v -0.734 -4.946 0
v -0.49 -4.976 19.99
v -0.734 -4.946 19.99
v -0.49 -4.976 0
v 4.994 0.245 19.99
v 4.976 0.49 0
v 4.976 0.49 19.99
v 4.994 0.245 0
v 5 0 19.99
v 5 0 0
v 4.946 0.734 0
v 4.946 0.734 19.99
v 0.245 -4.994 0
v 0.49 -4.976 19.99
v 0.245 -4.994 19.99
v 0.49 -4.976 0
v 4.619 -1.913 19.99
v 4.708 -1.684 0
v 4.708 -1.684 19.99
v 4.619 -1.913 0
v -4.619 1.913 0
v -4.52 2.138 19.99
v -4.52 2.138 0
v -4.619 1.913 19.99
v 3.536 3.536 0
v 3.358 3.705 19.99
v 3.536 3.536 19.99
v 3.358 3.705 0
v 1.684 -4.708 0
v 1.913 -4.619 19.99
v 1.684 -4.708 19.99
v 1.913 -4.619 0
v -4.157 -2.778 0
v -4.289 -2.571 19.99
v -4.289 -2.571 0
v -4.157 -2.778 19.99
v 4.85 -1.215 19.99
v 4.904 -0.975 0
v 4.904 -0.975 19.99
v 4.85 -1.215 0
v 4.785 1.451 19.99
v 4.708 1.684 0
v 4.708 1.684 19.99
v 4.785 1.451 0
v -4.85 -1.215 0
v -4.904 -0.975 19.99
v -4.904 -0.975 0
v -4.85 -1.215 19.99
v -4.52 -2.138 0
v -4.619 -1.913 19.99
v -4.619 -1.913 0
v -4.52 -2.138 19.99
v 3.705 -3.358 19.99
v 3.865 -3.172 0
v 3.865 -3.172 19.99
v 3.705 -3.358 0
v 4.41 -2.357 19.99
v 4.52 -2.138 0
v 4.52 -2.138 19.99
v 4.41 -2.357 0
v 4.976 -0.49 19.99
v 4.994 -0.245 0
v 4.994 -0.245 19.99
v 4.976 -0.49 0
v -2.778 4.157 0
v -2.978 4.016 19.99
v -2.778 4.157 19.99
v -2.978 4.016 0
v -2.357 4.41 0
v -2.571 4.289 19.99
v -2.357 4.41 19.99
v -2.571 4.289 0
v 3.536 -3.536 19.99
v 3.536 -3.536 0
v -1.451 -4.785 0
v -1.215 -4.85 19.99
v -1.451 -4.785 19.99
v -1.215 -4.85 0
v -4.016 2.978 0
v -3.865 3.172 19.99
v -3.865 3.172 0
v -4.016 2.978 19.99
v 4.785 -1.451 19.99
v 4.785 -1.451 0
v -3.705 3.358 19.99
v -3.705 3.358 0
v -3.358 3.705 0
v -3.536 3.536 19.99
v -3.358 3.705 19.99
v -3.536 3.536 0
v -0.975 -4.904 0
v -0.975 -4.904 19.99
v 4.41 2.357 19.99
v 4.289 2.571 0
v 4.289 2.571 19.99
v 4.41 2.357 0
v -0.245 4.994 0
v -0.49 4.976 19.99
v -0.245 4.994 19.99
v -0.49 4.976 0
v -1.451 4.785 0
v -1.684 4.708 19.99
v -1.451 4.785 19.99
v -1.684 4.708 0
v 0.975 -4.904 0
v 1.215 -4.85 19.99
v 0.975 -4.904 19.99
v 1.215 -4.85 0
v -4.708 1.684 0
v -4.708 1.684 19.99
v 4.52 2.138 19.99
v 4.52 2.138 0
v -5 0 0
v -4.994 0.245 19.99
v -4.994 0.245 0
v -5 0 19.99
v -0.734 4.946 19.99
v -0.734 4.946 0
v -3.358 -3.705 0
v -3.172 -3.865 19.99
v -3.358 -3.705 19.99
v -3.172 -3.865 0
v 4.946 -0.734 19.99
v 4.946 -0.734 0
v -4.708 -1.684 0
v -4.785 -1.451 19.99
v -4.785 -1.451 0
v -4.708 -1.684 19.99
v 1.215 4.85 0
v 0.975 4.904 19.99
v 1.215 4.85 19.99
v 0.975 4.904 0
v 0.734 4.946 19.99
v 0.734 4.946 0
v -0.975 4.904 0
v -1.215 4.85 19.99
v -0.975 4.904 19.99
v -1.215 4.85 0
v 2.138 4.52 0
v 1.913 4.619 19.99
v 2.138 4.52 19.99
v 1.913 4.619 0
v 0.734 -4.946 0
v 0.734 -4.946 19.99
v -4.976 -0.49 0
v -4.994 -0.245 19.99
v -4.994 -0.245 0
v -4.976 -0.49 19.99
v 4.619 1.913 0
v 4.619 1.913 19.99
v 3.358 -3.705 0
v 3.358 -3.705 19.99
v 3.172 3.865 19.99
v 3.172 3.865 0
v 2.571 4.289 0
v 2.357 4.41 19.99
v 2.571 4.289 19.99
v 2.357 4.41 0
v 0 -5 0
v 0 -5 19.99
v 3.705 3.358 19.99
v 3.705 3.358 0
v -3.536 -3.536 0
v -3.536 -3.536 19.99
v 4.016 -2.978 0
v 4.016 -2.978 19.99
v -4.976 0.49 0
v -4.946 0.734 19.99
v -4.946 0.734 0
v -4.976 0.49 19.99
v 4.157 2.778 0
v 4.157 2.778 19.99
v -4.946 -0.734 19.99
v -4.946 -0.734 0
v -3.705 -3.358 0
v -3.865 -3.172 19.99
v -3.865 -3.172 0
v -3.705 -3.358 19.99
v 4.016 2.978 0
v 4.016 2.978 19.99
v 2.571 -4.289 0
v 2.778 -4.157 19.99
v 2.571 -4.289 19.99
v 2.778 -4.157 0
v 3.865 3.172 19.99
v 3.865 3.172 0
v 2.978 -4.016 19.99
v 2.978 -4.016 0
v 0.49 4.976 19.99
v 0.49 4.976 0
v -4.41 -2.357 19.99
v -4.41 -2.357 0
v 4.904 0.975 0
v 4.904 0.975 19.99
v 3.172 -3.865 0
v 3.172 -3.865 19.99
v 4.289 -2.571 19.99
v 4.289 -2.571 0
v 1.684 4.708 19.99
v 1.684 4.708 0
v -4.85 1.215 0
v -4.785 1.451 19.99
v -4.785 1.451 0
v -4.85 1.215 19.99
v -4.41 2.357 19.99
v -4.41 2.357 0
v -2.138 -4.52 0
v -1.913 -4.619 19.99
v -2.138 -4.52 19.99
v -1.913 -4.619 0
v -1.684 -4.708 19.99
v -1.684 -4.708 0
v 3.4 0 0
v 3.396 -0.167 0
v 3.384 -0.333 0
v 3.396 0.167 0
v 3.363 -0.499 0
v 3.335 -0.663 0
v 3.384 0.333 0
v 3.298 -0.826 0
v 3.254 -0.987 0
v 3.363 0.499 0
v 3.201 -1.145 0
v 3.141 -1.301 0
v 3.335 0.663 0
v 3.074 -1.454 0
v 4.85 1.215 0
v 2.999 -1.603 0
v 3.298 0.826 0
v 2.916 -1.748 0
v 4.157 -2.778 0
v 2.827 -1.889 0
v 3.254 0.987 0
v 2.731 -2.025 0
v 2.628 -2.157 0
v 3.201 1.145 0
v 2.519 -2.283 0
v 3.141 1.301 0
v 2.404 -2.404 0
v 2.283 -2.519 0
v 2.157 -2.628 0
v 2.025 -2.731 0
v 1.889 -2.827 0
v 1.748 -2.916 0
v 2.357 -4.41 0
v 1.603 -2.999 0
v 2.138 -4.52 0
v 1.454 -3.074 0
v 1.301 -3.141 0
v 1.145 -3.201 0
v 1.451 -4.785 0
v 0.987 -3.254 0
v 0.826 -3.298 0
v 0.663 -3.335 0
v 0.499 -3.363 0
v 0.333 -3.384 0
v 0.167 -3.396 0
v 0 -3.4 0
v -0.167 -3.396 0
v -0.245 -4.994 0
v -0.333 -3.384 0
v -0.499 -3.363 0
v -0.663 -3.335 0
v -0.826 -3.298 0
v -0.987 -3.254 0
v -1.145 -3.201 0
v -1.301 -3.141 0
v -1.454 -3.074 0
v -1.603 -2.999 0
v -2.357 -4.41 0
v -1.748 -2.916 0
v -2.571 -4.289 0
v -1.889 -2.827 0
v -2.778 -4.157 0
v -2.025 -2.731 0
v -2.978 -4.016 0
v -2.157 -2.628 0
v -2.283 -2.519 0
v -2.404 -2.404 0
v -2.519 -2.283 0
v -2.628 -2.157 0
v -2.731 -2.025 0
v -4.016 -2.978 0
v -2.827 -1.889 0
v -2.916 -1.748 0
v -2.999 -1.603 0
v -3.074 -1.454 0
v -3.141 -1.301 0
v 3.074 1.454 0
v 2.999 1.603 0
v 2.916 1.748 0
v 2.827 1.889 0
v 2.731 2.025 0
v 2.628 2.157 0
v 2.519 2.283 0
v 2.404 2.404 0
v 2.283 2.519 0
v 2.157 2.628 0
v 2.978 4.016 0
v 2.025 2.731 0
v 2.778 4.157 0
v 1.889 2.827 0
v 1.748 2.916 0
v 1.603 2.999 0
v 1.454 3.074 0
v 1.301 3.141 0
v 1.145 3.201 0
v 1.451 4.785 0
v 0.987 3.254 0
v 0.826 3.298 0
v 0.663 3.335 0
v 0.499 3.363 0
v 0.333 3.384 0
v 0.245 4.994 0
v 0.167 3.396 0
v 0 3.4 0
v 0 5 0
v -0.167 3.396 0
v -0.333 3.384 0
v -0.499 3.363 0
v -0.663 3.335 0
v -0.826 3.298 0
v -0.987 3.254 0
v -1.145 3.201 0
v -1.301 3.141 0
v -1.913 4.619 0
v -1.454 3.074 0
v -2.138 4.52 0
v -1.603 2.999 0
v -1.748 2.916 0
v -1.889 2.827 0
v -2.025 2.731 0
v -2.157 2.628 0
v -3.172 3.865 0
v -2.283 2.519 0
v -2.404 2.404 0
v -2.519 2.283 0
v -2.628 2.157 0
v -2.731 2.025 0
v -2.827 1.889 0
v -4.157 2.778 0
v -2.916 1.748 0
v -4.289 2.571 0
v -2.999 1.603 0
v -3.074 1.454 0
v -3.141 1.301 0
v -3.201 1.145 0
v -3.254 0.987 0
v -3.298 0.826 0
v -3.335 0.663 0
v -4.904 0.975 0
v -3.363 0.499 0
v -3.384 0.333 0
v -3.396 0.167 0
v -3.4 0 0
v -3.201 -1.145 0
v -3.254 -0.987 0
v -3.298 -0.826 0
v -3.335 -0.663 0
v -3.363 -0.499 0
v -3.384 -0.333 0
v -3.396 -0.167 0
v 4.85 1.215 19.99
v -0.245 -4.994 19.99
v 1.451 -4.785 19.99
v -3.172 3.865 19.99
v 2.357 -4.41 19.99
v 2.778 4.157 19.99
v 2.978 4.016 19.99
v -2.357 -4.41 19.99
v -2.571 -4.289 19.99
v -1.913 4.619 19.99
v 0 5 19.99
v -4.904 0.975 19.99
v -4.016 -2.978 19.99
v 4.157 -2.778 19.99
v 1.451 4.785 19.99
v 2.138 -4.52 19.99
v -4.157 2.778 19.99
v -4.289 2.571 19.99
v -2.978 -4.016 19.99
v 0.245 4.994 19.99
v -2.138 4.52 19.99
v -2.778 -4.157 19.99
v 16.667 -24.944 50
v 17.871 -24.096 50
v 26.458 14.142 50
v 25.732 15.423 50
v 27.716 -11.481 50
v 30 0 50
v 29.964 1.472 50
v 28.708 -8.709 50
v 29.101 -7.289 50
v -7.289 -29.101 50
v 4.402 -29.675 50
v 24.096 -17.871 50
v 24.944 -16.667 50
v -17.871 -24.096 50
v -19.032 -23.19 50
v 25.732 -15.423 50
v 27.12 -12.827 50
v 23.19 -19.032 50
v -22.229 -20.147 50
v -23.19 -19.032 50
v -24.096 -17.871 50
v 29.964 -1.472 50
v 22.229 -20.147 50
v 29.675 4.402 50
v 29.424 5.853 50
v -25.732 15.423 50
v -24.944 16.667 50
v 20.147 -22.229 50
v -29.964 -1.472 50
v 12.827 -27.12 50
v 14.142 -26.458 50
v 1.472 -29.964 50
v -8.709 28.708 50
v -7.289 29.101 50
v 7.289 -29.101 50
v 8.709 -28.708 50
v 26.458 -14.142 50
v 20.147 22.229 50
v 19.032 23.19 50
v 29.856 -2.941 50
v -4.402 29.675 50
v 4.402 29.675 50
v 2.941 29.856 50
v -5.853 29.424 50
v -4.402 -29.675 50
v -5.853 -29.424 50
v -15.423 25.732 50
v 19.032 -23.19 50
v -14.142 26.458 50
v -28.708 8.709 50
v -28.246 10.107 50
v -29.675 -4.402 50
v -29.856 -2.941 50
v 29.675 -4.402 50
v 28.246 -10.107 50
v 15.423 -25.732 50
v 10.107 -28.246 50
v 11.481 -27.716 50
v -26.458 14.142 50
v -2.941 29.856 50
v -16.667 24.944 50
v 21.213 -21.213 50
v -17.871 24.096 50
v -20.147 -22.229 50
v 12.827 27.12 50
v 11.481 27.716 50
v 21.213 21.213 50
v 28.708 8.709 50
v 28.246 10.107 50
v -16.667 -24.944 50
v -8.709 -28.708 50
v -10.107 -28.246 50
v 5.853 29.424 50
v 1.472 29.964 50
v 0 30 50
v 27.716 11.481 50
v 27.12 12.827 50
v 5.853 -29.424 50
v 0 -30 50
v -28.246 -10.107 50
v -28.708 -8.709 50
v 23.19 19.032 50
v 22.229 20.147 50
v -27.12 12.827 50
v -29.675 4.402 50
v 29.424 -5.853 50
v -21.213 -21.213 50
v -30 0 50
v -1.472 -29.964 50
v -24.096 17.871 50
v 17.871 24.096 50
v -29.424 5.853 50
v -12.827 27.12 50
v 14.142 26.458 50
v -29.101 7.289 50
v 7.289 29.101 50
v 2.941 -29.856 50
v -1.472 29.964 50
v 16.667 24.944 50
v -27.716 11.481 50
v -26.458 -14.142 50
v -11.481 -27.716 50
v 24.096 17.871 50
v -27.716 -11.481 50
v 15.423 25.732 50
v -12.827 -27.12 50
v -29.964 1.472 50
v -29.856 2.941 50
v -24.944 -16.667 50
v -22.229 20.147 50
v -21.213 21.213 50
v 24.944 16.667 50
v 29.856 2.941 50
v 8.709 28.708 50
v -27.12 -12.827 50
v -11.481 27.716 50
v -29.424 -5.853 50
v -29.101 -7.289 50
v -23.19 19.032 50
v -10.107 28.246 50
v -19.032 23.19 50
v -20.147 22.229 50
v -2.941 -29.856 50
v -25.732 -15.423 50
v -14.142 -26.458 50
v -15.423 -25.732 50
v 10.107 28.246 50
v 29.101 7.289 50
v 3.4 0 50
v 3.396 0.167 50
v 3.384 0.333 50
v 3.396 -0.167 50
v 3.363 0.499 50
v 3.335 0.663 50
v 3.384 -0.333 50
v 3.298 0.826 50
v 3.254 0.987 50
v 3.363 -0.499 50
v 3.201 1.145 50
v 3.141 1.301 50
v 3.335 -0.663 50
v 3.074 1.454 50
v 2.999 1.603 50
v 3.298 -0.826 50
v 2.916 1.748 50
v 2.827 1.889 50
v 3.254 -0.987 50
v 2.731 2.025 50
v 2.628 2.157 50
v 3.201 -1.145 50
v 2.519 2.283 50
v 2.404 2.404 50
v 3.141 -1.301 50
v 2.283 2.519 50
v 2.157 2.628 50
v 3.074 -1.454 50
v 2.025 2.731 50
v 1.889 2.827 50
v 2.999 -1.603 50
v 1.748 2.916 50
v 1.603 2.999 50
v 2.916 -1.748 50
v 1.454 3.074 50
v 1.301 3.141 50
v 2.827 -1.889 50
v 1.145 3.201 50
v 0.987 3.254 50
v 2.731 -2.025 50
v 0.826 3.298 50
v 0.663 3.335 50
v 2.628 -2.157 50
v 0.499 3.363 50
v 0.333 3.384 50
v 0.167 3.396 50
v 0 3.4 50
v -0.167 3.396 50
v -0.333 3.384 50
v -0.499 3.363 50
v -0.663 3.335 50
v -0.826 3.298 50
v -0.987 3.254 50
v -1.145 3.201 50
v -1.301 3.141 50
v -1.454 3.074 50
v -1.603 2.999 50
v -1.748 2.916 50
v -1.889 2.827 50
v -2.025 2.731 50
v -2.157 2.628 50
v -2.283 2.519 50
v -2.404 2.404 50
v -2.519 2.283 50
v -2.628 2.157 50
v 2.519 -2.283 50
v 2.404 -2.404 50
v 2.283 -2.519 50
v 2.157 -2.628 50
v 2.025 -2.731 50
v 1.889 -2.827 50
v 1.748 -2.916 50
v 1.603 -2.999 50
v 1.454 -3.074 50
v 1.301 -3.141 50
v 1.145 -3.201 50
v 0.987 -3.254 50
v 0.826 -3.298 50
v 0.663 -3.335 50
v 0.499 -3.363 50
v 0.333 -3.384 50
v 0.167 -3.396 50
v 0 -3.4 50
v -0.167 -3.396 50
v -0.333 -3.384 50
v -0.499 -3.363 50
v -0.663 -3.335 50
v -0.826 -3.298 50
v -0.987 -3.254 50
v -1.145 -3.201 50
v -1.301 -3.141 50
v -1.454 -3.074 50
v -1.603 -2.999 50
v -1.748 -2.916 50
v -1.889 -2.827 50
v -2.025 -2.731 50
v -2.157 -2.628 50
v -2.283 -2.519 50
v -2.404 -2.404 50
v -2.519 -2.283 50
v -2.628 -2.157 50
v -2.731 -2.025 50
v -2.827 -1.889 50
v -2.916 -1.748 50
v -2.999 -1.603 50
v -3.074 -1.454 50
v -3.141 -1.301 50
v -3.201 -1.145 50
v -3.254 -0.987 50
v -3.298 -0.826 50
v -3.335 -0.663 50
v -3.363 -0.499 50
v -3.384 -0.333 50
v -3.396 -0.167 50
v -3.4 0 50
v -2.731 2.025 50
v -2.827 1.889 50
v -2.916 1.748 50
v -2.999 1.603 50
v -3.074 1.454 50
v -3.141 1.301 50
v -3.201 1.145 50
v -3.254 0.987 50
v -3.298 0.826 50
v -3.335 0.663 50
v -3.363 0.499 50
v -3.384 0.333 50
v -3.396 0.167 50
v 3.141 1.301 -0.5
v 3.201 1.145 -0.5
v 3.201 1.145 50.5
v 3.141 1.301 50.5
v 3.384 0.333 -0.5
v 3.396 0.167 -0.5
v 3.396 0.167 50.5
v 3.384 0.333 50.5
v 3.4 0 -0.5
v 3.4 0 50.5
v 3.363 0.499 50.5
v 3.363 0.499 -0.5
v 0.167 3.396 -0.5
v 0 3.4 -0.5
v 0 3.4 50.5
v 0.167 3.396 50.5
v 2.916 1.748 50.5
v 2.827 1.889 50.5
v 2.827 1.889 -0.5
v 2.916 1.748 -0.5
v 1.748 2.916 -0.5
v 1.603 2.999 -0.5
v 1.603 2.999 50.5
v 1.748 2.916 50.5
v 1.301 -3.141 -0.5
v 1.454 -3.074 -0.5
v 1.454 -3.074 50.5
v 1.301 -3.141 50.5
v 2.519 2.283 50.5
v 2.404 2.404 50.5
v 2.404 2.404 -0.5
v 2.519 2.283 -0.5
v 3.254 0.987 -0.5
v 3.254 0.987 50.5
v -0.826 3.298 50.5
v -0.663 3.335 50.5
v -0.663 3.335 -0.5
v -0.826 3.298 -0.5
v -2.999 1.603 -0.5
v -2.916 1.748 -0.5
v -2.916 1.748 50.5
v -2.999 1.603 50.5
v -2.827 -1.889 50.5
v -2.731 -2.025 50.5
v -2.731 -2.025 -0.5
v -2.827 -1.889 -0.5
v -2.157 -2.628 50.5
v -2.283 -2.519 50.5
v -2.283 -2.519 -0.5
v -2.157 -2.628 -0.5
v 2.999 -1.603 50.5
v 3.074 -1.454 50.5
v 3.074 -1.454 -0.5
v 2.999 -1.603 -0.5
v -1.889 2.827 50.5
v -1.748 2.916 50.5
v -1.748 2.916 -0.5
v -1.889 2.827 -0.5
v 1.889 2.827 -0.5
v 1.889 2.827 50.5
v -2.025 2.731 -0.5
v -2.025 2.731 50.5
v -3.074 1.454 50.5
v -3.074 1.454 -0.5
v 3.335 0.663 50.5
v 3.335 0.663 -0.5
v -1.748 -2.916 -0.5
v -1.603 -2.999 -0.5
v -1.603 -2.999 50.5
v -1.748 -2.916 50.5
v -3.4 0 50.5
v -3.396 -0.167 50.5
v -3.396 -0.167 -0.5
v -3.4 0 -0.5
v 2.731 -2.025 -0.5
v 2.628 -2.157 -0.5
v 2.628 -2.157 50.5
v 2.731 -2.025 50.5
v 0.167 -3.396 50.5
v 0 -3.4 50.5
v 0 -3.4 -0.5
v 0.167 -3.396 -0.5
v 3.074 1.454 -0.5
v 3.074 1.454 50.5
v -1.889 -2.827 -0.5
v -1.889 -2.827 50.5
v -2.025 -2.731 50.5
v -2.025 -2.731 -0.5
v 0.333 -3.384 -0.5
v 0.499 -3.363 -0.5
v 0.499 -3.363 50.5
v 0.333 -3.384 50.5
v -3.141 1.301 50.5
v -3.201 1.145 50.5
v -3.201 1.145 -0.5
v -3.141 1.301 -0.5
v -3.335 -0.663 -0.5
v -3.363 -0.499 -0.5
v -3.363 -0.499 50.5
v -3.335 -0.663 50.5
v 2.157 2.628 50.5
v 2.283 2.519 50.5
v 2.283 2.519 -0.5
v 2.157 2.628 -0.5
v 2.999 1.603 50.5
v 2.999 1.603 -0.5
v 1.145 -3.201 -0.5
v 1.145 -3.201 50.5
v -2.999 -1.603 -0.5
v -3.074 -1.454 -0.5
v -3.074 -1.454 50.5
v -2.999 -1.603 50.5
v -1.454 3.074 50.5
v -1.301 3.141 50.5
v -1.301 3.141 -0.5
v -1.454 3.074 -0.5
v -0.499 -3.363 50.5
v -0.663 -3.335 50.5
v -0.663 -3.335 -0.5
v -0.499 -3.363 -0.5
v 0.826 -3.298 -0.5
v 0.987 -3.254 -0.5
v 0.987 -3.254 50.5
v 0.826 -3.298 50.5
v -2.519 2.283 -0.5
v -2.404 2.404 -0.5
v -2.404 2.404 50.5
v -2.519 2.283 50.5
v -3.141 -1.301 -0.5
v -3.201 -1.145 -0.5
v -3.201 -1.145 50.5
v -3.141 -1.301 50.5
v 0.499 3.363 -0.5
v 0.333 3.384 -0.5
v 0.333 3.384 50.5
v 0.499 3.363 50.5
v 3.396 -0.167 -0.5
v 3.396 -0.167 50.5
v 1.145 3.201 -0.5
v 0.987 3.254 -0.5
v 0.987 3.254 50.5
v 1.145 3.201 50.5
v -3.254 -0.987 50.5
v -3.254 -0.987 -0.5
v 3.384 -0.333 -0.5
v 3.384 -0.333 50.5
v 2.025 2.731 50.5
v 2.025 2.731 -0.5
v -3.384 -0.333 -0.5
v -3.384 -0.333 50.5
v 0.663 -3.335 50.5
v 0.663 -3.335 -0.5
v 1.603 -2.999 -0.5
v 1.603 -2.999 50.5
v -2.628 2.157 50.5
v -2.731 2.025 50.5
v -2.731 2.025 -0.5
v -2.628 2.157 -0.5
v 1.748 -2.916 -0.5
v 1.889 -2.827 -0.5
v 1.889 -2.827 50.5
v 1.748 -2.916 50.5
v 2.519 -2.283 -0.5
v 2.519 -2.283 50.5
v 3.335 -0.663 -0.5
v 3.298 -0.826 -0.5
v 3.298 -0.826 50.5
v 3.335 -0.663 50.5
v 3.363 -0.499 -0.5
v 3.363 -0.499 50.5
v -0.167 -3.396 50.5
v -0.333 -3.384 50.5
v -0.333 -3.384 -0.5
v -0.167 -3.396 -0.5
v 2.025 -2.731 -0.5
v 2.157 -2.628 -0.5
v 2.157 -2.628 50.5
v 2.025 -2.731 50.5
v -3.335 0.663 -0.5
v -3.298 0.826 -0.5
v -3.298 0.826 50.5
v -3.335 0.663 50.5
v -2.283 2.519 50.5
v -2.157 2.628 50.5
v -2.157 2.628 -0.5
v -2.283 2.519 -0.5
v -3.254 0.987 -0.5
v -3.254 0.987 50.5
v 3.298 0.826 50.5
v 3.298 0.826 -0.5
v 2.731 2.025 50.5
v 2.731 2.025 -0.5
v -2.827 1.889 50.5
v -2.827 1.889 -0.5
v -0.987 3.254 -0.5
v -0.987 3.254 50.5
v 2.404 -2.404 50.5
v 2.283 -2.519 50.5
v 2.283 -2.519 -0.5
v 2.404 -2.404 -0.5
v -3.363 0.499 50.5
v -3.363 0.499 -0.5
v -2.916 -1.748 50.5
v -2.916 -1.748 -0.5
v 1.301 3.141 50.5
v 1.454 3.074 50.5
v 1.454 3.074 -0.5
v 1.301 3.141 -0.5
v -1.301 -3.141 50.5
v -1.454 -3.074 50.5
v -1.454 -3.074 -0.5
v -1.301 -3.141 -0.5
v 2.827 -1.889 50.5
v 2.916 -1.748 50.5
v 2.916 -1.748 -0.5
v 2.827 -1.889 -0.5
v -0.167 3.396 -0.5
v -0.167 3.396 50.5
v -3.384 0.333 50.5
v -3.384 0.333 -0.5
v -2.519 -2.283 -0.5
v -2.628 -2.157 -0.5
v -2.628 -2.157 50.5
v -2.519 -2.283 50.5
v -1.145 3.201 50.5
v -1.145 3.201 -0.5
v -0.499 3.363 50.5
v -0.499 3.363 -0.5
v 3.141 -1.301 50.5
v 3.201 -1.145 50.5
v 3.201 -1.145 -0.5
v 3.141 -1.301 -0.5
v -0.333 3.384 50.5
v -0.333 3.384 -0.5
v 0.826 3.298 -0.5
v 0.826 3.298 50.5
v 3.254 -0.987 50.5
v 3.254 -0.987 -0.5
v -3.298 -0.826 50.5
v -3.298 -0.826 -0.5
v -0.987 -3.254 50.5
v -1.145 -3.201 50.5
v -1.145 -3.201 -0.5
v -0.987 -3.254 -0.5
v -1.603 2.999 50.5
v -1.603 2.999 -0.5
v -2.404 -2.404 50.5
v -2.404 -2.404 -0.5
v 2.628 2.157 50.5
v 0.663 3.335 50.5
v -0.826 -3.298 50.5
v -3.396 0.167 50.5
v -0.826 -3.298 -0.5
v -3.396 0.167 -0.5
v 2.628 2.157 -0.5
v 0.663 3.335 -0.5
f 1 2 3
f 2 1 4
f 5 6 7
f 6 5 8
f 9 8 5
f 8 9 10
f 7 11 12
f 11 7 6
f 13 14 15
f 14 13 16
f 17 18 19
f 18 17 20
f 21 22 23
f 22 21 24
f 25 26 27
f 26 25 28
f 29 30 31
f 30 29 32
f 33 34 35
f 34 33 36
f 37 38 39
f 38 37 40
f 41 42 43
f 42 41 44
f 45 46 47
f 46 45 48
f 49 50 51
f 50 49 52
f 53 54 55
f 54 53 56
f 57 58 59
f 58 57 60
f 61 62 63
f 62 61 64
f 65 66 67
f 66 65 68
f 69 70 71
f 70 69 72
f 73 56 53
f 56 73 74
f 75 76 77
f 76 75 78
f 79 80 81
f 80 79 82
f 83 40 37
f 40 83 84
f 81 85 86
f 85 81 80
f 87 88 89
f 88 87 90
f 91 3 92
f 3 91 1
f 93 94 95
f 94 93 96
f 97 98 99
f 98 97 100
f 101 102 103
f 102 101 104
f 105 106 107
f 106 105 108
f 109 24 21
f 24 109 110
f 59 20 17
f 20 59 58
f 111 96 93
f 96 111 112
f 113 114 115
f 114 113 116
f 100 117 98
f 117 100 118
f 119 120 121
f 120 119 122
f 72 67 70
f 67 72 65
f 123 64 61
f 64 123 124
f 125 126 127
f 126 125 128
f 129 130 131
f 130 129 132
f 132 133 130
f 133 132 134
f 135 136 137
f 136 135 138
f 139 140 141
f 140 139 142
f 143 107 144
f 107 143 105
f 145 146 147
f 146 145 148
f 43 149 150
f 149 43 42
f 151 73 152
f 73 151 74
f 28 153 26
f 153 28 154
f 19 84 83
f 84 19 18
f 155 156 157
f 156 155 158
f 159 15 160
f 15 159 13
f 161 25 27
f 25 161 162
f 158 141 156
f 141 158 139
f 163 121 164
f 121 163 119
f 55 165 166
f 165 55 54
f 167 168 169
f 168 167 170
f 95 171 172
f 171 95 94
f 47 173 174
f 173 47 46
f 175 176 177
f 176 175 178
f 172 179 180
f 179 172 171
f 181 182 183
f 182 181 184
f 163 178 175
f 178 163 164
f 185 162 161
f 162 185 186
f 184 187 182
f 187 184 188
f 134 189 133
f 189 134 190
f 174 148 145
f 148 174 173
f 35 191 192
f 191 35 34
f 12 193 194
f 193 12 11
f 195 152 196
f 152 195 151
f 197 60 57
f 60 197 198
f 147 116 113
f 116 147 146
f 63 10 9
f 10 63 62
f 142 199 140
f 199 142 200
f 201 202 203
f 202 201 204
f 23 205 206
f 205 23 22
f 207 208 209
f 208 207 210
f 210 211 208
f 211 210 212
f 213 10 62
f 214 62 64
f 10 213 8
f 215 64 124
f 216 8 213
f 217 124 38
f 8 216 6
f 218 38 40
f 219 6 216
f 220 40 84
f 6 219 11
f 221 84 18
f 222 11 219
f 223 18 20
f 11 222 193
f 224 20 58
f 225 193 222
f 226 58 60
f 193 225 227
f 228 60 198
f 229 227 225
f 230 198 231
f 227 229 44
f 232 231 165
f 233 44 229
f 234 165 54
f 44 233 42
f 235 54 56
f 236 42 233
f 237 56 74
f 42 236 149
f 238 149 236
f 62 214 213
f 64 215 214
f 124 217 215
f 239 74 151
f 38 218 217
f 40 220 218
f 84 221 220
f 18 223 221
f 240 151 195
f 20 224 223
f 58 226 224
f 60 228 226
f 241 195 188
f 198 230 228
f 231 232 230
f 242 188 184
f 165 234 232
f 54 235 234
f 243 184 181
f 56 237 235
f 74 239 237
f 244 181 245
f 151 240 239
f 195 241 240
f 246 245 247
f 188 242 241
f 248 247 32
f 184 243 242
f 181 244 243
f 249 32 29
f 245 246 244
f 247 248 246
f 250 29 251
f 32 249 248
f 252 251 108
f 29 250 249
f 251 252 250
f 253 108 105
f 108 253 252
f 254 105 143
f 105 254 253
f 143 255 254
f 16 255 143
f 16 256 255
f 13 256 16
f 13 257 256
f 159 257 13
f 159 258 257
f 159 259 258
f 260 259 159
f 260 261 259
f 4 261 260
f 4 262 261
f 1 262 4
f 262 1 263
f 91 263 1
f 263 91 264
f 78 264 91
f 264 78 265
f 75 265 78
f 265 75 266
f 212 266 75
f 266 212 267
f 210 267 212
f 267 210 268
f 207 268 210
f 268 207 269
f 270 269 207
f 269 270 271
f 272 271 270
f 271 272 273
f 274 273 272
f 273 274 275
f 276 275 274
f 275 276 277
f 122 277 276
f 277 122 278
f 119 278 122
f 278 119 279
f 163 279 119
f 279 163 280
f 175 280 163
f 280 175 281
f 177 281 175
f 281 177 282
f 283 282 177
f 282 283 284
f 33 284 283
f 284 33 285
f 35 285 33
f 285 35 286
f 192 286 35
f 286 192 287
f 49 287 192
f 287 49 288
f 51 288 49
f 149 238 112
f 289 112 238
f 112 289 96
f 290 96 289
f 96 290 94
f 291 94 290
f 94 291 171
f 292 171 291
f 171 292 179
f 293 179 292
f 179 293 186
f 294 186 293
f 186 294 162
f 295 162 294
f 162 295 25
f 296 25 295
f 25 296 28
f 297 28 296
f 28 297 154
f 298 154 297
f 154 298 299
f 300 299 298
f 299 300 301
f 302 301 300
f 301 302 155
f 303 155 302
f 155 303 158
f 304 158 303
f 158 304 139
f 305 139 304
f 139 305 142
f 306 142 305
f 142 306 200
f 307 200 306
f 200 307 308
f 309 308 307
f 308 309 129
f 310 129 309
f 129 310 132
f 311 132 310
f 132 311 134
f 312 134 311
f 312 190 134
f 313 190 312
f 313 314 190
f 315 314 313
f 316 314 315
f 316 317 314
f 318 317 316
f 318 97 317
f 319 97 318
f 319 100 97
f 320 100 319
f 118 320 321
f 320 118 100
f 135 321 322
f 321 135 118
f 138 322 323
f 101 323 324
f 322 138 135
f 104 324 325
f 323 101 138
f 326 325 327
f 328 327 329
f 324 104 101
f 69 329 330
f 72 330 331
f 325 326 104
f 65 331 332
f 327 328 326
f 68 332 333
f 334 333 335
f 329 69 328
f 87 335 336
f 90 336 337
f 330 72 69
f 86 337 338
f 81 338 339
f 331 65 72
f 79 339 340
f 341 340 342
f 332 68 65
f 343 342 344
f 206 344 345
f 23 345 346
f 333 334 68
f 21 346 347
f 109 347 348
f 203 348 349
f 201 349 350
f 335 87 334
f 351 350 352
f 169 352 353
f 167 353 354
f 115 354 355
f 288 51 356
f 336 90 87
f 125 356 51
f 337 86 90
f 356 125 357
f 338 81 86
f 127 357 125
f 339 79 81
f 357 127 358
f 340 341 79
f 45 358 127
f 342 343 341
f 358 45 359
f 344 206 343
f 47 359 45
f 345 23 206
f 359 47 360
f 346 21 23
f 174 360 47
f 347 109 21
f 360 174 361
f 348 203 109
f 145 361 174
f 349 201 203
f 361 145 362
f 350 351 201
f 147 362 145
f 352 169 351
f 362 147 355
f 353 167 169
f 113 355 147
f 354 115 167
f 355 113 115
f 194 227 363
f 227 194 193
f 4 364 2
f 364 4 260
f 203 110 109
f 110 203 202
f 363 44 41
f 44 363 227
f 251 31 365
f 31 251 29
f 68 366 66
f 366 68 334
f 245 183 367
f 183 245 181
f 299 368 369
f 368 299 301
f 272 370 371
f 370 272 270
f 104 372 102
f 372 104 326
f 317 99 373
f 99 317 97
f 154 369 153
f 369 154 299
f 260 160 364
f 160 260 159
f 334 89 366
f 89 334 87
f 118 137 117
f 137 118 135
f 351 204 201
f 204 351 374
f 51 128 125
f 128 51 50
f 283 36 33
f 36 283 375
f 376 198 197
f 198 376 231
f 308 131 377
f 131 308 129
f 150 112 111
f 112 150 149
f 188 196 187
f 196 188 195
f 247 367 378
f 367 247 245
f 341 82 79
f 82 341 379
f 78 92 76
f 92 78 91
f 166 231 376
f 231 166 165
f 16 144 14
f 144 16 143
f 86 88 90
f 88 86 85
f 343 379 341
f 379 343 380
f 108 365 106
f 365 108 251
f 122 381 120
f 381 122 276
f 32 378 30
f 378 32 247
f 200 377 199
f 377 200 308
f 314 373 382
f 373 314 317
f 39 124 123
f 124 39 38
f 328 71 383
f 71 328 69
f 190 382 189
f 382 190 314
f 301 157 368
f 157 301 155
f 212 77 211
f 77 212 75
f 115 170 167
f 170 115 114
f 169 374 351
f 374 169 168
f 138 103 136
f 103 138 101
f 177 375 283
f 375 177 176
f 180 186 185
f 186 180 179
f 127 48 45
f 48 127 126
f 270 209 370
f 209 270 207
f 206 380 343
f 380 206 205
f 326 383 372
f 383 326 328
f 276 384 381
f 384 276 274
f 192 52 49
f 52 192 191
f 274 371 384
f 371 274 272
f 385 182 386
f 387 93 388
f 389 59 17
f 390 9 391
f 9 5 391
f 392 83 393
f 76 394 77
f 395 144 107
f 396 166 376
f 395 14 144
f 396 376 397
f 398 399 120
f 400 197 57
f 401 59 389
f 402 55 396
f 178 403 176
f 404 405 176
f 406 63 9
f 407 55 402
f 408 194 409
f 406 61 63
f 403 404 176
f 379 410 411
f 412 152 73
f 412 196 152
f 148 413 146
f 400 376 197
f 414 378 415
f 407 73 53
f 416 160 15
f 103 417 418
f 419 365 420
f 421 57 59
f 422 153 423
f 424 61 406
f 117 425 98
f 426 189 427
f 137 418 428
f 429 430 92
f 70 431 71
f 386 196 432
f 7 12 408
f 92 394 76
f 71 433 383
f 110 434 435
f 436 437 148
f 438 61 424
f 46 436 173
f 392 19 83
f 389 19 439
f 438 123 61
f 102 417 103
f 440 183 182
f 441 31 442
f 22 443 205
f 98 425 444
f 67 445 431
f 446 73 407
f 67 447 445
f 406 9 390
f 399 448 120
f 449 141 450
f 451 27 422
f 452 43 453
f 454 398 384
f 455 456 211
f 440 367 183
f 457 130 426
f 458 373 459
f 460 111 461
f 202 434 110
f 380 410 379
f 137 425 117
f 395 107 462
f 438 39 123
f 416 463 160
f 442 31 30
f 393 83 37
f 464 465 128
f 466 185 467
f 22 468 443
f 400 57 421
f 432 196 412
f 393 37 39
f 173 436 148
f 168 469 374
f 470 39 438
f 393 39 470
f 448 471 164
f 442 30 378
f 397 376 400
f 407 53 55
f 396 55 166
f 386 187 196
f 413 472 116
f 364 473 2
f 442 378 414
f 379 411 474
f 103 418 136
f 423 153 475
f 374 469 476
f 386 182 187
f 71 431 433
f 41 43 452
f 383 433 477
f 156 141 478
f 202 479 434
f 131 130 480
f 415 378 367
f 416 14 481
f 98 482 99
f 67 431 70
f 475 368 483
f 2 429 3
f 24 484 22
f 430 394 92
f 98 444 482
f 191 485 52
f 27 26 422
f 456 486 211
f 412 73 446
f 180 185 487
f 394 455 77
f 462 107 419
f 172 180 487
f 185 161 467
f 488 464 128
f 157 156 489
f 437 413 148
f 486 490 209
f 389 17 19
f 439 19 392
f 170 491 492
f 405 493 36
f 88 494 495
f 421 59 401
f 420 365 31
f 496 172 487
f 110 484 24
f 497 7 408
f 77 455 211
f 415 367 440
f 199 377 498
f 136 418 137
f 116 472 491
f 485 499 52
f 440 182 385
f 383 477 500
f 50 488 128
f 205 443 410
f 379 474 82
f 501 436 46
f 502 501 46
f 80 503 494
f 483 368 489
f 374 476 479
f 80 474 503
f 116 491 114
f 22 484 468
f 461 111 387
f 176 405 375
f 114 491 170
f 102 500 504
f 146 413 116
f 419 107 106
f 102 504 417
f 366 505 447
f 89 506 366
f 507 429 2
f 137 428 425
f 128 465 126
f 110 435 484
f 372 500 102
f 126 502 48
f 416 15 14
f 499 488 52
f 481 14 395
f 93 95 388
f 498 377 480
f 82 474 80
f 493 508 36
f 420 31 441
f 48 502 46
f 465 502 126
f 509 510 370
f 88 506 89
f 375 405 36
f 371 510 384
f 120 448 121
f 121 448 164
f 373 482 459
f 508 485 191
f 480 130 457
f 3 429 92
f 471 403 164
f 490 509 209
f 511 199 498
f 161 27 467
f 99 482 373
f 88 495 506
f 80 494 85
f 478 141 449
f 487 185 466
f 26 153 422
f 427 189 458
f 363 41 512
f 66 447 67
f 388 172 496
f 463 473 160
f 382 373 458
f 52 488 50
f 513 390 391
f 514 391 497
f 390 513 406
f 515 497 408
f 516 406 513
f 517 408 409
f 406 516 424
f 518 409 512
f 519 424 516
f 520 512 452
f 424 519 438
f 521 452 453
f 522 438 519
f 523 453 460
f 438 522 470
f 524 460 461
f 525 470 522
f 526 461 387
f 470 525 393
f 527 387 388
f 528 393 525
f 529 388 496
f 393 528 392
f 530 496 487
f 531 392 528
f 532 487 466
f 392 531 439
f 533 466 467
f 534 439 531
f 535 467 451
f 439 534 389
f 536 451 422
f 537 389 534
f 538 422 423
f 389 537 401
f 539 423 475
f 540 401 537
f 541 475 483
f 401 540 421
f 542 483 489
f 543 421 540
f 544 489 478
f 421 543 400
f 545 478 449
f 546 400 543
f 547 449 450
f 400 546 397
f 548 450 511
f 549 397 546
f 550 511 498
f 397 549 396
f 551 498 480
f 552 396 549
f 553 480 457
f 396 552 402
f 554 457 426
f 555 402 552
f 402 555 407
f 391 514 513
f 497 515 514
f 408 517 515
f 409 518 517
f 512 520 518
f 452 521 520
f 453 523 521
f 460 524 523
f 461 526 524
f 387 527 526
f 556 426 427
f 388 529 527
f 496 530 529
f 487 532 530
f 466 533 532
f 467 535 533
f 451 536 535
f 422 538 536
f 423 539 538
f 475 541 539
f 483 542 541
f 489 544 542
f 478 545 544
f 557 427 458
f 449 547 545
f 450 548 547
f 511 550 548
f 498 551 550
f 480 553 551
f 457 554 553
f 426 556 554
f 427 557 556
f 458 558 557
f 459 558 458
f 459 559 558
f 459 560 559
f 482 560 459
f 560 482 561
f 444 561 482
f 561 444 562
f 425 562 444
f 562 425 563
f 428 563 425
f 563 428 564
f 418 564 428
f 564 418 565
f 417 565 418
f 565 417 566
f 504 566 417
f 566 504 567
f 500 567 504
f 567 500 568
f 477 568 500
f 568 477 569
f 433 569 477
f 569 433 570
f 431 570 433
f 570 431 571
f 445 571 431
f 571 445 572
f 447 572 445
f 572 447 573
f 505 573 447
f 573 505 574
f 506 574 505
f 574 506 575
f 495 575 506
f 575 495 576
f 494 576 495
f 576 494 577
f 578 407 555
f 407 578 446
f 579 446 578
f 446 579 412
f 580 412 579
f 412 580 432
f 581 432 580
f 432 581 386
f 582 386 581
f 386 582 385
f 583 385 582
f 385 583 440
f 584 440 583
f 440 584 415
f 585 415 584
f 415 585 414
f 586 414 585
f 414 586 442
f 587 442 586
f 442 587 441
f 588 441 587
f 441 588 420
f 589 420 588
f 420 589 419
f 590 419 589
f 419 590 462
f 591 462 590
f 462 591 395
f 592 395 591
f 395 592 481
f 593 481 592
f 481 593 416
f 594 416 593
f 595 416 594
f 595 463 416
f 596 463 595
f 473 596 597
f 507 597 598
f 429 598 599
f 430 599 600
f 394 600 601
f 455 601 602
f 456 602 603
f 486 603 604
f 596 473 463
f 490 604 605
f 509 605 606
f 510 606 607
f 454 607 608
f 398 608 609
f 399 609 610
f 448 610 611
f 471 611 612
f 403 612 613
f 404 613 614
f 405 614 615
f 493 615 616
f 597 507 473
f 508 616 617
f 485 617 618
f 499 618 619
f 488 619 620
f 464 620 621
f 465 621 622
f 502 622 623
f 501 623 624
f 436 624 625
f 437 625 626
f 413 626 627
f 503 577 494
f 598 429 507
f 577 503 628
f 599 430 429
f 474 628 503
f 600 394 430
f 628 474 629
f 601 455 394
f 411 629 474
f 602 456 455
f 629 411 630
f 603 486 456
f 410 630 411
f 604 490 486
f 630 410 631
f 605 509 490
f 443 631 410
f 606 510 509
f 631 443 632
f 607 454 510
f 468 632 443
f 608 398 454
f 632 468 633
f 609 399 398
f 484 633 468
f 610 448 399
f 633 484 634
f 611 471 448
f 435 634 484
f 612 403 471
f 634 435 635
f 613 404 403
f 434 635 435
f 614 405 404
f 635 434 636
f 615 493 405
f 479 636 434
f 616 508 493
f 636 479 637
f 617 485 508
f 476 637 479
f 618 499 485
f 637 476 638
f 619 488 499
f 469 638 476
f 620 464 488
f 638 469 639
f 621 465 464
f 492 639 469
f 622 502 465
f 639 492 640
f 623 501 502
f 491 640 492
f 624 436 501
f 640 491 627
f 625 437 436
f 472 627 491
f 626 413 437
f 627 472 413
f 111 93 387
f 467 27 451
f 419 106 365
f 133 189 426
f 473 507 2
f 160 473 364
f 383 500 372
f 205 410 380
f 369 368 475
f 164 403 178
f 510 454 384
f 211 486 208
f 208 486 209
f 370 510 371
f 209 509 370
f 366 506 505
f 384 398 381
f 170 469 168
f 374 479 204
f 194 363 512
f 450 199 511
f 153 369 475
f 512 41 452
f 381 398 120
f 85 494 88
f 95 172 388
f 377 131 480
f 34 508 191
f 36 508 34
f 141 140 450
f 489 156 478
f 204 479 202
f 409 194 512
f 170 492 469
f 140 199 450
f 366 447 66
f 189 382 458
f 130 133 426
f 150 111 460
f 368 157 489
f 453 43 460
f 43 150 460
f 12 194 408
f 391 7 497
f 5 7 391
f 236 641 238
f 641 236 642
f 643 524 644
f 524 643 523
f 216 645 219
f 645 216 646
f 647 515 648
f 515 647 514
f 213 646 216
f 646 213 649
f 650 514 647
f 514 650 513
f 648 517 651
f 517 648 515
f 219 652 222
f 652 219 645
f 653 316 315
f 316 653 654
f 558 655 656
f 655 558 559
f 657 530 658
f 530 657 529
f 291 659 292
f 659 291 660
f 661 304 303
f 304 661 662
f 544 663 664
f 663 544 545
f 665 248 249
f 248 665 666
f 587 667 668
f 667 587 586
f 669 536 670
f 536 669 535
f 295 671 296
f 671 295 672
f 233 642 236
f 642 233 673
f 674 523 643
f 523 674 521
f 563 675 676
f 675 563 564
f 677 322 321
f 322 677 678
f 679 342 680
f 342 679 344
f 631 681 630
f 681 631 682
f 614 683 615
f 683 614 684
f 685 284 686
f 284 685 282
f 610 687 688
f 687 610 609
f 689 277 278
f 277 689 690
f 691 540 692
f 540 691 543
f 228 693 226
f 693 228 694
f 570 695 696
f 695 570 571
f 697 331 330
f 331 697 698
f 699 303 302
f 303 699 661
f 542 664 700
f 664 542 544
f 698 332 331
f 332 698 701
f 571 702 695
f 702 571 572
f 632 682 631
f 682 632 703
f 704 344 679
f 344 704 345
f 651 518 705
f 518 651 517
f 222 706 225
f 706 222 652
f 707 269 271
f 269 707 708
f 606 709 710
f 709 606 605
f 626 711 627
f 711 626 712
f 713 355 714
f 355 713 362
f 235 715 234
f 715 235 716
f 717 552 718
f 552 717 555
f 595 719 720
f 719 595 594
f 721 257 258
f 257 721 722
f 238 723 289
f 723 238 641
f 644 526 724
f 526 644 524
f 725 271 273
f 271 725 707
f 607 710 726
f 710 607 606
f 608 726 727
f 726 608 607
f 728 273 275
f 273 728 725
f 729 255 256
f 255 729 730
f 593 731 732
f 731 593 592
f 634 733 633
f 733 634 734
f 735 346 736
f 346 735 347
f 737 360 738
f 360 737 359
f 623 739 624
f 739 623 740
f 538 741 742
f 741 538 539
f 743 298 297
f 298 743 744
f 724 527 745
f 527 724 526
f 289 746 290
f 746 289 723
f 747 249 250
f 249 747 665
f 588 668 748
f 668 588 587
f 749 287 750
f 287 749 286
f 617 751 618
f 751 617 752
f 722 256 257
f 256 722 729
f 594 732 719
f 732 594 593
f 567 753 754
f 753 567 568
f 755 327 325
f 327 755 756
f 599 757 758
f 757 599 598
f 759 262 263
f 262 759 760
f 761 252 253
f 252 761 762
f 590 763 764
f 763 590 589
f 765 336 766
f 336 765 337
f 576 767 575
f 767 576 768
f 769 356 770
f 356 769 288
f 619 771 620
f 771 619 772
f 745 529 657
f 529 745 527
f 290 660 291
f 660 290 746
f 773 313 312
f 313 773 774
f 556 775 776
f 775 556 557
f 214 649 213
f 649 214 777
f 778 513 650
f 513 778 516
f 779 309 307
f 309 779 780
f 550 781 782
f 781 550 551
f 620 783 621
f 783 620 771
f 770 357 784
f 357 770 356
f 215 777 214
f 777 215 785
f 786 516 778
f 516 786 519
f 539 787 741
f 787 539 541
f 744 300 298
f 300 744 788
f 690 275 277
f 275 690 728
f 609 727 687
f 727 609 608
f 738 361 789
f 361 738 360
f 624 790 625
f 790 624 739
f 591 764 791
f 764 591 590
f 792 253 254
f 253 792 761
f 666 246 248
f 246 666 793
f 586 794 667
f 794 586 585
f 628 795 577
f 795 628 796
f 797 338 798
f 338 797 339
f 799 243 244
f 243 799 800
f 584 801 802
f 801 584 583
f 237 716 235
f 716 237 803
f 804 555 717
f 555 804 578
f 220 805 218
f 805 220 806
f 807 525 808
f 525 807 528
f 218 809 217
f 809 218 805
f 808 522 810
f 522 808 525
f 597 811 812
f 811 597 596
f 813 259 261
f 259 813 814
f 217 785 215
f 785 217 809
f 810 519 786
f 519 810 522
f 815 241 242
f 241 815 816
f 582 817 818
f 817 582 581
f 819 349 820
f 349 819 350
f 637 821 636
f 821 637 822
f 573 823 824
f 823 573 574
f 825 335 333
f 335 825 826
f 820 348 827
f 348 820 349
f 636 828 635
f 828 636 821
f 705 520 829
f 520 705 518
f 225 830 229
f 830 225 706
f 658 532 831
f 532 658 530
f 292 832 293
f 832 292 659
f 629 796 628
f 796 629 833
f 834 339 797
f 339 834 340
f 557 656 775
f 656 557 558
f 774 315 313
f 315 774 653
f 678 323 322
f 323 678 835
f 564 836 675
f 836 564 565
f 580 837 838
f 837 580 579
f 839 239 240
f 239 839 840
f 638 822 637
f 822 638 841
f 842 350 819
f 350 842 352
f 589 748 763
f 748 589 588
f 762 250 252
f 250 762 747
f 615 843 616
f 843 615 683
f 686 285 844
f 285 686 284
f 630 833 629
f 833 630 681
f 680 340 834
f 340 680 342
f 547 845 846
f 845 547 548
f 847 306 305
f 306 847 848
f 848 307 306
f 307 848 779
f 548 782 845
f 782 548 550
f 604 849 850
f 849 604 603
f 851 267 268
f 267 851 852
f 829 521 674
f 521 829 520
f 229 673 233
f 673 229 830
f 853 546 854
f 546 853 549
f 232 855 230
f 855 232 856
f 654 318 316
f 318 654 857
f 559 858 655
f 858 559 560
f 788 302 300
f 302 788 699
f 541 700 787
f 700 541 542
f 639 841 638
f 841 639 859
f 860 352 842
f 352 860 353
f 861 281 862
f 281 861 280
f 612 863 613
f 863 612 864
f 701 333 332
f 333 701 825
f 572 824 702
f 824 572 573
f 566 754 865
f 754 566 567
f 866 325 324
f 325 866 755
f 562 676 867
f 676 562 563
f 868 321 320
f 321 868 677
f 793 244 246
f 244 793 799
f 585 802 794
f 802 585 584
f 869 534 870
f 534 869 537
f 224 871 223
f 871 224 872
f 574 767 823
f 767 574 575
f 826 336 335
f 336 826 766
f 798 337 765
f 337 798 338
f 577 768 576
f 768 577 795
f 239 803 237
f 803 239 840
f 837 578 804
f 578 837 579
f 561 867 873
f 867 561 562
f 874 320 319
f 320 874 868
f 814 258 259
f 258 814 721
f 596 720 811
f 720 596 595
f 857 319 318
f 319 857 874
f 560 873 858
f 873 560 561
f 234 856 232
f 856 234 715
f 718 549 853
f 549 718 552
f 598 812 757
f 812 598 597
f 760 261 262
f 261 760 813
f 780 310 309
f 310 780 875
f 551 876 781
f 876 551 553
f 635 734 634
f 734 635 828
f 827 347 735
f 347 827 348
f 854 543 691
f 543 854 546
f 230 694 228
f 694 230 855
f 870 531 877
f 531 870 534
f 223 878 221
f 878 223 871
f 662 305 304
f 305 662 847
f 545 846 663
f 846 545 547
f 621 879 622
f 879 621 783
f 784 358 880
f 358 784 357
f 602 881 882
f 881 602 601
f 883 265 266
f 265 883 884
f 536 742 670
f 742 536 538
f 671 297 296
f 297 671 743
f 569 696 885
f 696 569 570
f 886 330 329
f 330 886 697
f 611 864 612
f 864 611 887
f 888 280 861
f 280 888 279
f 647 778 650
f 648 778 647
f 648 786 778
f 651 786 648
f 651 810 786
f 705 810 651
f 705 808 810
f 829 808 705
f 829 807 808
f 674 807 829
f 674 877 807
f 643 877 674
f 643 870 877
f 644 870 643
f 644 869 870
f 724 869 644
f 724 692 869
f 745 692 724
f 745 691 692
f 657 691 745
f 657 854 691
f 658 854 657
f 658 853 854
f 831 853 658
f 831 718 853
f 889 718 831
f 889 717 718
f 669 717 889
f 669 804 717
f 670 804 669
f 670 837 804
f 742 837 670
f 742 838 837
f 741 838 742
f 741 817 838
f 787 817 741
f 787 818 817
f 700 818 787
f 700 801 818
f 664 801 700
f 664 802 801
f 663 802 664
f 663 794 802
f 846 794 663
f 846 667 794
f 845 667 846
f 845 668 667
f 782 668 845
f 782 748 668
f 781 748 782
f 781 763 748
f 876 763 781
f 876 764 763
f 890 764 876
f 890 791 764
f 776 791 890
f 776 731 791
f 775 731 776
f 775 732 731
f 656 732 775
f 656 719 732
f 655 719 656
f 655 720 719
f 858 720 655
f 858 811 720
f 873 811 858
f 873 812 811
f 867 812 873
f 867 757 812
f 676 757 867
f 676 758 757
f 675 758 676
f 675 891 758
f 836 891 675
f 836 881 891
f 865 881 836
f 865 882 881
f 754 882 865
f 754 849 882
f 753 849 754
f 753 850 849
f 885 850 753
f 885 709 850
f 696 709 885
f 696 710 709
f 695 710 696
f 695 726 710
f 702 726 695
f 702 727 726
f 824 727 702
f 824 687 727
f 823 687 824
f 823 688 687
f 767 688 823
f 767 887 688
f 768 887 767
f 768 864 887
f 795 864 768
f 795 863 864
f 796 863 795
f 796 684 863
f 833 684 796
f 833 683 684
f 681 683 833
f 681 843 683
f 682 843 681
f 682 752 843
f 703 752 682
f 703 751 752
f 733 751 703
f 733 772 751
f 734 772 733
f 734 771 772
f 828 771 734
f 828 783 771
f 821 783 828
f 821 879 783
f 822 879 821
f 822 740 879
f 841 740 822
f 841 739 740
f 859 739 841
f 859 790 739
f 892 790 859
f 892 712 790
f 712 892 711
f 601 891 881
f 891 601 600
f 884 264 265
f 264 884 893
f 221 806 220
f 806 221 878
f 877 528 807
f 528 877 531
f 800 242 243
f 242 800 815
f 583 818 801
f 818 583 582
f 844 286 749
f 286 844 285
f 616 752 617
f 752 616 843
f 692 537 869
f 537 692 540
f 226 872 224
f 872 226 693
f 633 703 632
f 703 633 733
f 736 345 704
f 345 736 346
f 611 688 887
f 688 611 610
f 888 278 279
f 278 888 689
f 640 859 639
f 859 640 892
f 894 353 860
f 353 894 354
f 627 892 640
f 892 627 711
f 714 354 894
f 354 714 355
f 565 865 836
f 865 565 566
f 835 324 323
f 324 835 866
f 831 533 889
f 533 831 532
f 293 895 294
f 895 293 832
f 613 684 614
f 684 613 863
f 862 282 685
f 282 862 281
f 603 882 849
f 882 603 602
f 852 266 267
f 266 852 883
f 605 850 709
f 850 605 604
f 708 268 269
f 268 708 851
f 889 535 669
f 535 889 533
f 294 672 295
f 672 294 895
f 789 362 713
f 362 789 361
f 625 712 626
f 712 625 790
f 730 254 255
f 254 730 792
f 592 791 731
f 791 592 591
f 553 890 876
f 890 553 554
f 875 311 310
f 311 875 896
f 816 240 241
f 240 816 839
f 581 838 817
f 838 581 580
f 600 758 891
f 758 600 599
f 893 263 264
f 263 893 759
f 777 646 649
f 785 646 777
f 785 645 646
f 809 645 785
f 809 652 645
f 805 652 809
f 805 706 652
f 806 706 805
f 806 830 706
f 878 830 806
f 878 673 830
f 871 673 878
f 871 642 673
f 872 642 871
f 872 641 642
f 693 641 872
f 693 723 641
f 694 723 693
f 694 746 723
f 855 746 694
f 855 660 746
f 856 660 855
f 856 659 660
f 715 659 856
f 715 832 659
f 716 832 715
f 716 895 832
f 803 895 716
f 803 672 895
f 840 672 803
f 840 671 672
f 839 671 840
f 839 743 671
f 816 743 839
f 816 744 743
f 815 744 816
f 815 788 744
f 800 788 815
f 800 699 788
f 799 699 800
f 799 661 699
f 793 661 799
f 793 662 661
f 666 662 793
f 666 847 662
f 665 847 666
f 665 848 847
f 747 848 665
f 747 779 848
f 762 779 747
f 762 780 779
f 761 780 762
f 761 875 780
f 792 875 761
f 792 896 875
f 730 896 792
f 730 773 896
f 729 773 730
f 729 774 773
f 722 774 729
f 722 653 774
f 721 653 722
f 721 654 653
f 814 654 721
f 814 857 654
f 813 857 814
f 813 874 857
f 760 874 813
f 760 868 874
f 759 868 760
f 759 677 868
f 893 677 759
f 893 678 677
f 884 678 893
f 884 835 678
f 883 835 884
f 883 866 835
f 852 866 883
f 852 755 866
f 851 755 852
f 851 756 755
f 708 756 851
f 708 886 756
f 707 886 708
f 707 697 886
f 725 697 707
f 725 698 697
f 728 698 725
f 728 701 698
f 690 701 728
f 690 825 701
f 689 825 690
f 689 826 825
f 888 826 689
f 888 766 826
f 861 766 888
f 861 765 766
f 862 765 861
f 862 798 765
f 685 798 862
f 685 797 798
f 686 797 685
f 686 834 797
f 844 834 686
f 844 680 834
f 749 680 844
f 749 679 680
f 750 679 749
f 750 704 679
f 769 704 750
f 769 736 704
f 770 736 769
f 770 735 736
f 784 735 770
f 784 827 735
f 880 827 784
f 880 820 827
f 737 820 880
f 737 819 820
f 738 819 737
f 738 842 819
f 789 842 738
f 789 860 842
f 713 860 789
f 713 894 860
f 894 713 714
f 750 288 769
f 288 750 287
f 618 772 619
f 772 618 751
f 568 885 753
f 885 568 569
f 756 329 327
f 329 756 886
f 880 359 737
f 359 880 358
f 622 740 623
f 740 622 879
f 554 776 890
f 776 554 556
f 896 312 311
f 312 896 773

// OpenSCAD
// Lab funnel - printed upright, open at top and bottom
// Units: mm

// ---- Parameters ----
spout_od      = 10;    // spout outer diameter
spout_h       = 20;    // spout height (z = 0 to 20)
cone_od_top   = 60;    // cone rim outer diameter (z = 50)
cone_h        = 30;    // cone height (z = 20 to 50)
wall          = 1.6;   // wall thickness everywhere
eps           = 0.5;   // cutter overshoot past faces

$fn = 128;

// ---- Derived ----
spout_id = spout_od - 2 * wall;   // bore diameter
cone_id_top = cone_od_top - 2 * wall; // rim bore diameter

// ---- Model ----
union() {
    // Spout (tube)
    translate([0, 0, 0])
        cylinder(d = spout_od, h = spout_h);

    // Cone (welded into spout, overlapping the junction)
    translate([0, 0, spout_h - 0.01])
        cylinder(d1 = spout_od, d2 = cone_od_top, h = cone_h + 0.01);
}

// Cut the bore through the full height (open bottom and top)
translate([0, 0, -eps])
    cylinder(d = spout_id, h = spout_h + cone_h + 2 * eps);
